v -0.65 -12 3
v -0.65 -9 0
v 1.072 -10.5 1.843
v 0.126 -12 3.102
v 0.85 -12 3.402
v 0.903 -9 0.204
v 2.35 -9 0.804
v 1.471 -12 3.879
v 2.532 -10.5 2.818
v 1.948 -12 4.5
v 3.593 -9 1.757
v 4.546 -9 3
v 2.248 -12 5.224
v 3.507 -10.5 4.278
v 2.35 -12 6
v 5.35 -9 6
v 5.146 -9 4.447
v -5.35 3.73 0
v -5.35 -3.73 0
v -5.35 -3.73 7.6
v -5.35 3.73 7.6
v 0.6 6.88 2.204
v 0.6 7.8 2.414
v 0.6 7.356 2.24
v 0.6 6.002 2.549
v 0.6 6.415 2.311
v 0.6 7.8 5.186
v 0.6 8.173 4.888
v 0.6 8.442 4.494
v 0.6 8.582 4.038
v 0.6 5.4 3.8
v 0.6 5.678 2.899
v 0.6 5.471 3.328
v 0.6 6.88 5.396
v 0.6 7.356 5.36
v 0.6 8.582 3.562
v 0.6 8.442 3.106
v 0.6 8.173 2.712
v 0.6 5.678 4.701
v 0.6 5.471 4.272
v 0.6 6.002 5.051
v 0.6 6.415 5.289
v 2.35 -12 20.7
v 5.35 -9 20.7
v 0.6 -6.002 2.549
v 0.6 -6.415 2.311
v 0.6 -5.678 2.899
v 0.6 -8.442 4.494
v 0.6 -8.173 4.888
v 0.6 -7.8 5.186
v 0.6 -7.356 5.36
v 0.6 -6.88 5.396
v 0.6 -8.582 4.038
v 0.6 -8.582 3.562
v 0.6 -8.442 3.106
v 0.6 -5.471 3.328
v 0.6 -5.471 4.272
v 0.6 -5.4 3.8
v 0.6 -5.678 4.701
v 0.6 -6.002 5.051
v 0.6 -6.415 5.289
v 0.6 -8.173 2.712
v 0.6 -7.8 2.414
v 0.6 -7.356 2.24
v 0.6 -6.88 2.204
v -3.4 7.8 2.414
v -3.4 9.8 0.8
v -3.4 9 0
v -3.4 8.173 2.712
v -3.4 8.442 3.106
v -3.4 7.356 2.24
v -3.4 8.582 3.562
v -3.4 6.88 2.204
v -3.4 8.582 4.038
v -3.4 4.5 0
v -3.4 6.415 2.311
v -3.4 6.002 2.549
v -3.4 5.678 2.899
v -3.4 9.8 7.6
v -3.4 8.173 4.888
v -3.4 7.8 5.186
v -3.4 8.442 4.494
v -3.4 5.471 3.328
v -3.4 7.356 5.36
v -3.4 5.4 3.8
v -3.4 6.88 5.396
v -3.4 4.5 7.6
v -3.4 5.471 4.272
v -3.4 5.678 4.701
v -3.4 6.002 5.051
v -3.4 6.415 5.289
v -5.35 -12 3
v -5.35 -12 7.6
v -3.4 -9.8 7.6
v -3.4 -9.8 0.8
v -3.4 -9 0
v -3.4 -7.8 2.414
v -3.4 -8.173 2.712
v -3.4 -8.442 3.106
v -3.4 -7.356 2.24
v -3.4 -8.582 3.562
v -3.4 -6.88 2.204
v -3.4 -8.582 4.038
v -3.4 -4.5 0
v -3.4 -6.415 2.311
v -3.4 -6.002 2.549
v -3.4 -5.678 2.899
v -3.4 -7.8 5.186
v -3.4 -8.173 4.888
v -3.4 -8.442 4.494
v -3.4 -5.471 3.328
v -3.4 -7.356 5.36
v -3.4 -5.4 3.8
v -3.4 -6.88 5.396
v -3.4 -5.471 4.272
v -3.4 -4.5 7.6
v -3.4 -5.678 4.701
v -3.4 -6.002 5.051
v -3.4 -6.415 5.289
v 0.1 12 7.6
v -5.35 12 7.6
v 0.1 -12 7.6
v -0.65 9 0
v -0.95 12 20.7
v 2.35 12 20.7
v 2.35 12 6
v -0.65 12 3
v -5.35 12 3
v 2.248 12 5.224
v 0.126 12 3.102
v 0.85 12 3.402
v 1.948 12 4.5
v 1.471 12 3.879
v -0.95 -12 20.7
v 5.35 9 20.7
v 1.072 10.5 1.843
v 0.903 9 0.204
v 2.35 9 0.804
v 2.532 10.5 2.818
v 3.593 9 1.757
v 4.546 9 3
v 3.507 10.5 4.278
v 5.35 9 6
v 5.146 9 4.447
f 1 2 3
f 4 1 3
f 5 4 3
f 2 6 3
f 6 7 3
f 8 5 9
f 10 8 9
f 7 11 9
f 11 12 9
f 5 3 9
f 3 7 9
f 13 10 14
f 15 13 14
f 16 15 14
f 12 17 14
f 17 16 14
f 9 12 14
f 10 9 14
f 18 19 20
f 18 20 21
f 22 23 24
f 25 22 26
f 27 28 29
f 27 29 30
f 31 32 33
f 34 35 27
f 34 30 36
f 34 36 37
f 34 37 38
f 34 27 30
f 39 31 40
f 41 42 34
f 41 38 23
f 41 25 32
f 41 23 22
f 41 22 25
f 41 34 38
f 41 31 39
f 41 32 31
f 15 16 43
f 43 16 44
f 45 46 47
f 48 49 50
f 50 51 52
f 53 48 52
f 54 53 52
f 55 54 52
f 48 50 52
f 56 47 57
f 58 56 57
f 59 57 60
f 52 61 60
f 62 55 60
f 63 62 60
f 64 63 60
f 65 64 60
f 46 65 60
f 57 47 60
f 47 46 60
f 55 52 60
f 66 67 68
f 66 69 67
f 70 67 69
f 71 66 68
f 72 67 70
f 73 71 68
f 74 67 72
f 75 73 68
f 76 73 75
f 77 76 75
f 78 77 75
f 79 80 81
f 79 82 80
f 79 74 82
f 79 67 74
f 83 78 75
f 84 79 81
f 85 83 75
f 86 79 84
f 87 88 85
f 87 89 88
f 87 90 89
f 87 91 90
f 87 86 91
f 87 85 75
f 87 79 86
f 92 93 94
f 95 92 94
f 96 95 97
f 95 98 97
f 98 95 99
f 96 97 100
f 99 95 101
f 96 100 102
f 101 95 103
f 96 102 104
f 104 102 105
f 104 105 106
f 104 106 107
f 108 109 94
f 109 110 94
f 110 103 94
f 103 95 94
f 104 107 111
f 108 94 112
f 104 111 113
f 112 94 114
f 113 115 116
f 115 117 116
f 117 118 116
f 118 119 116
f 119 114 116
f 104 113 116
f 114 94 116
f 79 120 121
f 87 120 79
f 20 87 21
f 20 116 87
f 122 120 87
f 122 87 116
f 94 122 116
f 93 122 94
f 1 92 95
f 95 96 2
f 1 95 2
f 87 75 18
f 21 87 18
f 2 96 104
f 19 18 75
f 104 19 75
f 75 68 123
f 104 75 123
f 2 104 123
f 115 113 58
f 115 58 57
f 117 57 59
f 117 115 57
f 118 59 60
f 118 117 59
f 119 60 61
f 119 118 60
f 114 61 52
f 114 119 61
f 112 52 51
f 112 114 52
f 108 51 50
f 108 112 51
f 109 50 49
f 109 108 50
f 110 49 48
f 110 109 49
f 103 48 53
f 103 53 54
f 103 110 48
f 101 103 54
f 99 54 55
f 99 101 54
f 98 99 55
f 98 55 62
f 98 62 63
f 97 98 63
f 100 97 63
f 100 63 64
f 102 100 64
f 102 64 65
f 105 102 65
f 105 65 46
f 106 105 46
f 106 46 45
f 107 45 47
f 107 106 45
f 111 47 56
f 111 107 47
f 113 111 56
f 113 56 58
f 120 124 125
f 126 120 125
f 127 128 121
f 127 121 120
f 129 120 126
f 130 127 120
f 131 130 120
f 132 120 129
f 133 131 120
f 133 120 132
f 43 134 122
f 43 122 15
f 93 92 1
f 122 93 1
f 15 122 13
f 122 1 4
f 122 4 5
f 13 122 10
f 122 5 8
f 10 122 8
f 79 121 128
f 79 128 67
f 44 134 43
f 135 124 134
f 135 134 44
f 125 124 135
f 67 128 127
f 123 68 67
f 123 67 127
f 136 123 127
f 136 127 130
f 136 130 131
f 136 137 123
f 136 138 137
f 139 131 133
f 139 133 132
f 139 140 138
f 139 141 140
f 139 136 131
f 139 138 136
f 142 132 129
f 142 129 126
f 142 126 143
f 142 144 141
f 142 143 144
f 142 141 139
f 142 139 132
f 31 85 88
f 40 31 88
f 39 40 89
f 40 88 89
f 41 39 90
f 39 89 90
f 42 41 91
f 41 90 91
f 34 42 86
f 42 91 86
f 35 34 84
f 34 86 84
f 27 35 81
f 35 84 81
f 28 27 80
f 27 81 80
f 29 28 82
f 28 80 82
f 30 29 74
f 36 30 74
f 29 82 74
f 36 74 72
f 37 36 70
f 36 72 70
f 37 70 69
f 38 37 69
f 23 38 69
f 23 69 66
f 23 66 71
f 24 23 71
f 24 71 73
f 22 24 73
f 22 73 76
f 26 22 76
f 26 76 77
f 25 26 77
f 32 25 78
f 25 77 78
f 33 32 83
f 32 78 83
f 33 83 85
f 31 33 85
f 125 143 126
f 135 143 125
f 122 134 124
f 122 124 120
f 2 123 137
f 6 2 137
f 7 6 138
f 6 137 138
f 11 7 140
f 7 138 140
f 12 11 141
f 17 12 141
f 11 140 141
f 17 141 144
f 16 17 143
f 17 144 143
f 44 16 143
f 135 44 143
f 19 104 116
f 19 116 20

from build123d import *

# Parameters (mm, degrees)
SKETCH_W        = 10.7
SKETCH_H        = 24
PAD_DEPTH       = 20.7
POCKET_DEPTH    = 24.001
FILLET_R        = 6
POCKET001_DEPTH = 74.503317
SKETCH003_R     = 1.6
POCKET002_DEPTH = 4
CHAMFER_SIZE    = 3
CHAMFER001_SIZE = 3


with BuildPart() as part:
    # Sketch → Pad (new body)
    with BuildSketch(Plane.XY):
        Rectangle(SKETCH_W, SKETCH_H)
    extrude(amount=PAD_DEPTH)

    # Sketch001 (on Face3 of Pad) → Pocket (cut, through all)
    with BuildSketch(Plane.XZ.offset(12)):
        Polygon((-0.95, 20.7), (0.1, 7.6), (-5.35, 7.6), (-5.35, 20.7), align=None)
    extrude(amount=-POCKET_DEPTH, mode=Mode.SUBTRACT)

    # Fillet
    fillet_edges = [part.edges().sort_by_distance(p)[0] for p in [
        (5.35, 0, 0),
    ]]
    fillet(fillet_edges, radius=FILLET_R)

    # Sketch002 (on Face6 of Fillet) → Pocket001 (cut, through all)
    with BuildSketch(Plane.XY.offset(7.6)):
        Polygon((-5.35, 12), (-3.4, 9.8), (-3.4, 4.5), (-5.35, 3.73), align=None)
    pocket001 = extrude(amount=-POCKET001_DEPTH, mode=Mode.SUBTRACT)

    # Mirrored: Pocket001 across Sketch002 H_Axis
    add(pocket001.mirror(Plane(origin=(0, 0, 7.6), x_dir=(0, 0, 1), z_dir=(0, 1, 0))), mode=Mode.SUBTRACT)

    # Sketch003 (on Face9 of Mirrored) → Pocket002 (cut)
    with BuildSketch(Plane(origin=(-3.4, 0, 0), x_dir=(0, -1, 0), z_dir=(-1, 0, 0))):
        with Locations((-7, 3.8)):
            Circle(SKETCH003_R)
    pocket002 = extrude(amount=-POCKET002_DEPTH, mode=Mode.SUBTRACT)

    # Mirrored001: Pocket002 across Sketch003 V_Axis
    add(pocket002.mirror(Plane(origin=(-3.4, 0, 0), x_dir=(-1, 0, 0), z_dir=(0, -1, 0))), mode=Mode.SUBTRACT)

    # Chamfer
    chamfer_edges = [part.edges().sort_by_distance(p)[0] for p in [
        (5.35, -12, 13.35),
    ]]
    chamfer(chamfer_edges, length=CHAMFER_SIZE)

    # Chamfer001
    chamfer001_edges = [part.edges().sort_by_distance(p)[0] for p in [
        (5.35, 12, 13.35),
    ]]
    chamfer(chamfer001_edges, length=CHAMFER001_SIZE)


solid = part.part
